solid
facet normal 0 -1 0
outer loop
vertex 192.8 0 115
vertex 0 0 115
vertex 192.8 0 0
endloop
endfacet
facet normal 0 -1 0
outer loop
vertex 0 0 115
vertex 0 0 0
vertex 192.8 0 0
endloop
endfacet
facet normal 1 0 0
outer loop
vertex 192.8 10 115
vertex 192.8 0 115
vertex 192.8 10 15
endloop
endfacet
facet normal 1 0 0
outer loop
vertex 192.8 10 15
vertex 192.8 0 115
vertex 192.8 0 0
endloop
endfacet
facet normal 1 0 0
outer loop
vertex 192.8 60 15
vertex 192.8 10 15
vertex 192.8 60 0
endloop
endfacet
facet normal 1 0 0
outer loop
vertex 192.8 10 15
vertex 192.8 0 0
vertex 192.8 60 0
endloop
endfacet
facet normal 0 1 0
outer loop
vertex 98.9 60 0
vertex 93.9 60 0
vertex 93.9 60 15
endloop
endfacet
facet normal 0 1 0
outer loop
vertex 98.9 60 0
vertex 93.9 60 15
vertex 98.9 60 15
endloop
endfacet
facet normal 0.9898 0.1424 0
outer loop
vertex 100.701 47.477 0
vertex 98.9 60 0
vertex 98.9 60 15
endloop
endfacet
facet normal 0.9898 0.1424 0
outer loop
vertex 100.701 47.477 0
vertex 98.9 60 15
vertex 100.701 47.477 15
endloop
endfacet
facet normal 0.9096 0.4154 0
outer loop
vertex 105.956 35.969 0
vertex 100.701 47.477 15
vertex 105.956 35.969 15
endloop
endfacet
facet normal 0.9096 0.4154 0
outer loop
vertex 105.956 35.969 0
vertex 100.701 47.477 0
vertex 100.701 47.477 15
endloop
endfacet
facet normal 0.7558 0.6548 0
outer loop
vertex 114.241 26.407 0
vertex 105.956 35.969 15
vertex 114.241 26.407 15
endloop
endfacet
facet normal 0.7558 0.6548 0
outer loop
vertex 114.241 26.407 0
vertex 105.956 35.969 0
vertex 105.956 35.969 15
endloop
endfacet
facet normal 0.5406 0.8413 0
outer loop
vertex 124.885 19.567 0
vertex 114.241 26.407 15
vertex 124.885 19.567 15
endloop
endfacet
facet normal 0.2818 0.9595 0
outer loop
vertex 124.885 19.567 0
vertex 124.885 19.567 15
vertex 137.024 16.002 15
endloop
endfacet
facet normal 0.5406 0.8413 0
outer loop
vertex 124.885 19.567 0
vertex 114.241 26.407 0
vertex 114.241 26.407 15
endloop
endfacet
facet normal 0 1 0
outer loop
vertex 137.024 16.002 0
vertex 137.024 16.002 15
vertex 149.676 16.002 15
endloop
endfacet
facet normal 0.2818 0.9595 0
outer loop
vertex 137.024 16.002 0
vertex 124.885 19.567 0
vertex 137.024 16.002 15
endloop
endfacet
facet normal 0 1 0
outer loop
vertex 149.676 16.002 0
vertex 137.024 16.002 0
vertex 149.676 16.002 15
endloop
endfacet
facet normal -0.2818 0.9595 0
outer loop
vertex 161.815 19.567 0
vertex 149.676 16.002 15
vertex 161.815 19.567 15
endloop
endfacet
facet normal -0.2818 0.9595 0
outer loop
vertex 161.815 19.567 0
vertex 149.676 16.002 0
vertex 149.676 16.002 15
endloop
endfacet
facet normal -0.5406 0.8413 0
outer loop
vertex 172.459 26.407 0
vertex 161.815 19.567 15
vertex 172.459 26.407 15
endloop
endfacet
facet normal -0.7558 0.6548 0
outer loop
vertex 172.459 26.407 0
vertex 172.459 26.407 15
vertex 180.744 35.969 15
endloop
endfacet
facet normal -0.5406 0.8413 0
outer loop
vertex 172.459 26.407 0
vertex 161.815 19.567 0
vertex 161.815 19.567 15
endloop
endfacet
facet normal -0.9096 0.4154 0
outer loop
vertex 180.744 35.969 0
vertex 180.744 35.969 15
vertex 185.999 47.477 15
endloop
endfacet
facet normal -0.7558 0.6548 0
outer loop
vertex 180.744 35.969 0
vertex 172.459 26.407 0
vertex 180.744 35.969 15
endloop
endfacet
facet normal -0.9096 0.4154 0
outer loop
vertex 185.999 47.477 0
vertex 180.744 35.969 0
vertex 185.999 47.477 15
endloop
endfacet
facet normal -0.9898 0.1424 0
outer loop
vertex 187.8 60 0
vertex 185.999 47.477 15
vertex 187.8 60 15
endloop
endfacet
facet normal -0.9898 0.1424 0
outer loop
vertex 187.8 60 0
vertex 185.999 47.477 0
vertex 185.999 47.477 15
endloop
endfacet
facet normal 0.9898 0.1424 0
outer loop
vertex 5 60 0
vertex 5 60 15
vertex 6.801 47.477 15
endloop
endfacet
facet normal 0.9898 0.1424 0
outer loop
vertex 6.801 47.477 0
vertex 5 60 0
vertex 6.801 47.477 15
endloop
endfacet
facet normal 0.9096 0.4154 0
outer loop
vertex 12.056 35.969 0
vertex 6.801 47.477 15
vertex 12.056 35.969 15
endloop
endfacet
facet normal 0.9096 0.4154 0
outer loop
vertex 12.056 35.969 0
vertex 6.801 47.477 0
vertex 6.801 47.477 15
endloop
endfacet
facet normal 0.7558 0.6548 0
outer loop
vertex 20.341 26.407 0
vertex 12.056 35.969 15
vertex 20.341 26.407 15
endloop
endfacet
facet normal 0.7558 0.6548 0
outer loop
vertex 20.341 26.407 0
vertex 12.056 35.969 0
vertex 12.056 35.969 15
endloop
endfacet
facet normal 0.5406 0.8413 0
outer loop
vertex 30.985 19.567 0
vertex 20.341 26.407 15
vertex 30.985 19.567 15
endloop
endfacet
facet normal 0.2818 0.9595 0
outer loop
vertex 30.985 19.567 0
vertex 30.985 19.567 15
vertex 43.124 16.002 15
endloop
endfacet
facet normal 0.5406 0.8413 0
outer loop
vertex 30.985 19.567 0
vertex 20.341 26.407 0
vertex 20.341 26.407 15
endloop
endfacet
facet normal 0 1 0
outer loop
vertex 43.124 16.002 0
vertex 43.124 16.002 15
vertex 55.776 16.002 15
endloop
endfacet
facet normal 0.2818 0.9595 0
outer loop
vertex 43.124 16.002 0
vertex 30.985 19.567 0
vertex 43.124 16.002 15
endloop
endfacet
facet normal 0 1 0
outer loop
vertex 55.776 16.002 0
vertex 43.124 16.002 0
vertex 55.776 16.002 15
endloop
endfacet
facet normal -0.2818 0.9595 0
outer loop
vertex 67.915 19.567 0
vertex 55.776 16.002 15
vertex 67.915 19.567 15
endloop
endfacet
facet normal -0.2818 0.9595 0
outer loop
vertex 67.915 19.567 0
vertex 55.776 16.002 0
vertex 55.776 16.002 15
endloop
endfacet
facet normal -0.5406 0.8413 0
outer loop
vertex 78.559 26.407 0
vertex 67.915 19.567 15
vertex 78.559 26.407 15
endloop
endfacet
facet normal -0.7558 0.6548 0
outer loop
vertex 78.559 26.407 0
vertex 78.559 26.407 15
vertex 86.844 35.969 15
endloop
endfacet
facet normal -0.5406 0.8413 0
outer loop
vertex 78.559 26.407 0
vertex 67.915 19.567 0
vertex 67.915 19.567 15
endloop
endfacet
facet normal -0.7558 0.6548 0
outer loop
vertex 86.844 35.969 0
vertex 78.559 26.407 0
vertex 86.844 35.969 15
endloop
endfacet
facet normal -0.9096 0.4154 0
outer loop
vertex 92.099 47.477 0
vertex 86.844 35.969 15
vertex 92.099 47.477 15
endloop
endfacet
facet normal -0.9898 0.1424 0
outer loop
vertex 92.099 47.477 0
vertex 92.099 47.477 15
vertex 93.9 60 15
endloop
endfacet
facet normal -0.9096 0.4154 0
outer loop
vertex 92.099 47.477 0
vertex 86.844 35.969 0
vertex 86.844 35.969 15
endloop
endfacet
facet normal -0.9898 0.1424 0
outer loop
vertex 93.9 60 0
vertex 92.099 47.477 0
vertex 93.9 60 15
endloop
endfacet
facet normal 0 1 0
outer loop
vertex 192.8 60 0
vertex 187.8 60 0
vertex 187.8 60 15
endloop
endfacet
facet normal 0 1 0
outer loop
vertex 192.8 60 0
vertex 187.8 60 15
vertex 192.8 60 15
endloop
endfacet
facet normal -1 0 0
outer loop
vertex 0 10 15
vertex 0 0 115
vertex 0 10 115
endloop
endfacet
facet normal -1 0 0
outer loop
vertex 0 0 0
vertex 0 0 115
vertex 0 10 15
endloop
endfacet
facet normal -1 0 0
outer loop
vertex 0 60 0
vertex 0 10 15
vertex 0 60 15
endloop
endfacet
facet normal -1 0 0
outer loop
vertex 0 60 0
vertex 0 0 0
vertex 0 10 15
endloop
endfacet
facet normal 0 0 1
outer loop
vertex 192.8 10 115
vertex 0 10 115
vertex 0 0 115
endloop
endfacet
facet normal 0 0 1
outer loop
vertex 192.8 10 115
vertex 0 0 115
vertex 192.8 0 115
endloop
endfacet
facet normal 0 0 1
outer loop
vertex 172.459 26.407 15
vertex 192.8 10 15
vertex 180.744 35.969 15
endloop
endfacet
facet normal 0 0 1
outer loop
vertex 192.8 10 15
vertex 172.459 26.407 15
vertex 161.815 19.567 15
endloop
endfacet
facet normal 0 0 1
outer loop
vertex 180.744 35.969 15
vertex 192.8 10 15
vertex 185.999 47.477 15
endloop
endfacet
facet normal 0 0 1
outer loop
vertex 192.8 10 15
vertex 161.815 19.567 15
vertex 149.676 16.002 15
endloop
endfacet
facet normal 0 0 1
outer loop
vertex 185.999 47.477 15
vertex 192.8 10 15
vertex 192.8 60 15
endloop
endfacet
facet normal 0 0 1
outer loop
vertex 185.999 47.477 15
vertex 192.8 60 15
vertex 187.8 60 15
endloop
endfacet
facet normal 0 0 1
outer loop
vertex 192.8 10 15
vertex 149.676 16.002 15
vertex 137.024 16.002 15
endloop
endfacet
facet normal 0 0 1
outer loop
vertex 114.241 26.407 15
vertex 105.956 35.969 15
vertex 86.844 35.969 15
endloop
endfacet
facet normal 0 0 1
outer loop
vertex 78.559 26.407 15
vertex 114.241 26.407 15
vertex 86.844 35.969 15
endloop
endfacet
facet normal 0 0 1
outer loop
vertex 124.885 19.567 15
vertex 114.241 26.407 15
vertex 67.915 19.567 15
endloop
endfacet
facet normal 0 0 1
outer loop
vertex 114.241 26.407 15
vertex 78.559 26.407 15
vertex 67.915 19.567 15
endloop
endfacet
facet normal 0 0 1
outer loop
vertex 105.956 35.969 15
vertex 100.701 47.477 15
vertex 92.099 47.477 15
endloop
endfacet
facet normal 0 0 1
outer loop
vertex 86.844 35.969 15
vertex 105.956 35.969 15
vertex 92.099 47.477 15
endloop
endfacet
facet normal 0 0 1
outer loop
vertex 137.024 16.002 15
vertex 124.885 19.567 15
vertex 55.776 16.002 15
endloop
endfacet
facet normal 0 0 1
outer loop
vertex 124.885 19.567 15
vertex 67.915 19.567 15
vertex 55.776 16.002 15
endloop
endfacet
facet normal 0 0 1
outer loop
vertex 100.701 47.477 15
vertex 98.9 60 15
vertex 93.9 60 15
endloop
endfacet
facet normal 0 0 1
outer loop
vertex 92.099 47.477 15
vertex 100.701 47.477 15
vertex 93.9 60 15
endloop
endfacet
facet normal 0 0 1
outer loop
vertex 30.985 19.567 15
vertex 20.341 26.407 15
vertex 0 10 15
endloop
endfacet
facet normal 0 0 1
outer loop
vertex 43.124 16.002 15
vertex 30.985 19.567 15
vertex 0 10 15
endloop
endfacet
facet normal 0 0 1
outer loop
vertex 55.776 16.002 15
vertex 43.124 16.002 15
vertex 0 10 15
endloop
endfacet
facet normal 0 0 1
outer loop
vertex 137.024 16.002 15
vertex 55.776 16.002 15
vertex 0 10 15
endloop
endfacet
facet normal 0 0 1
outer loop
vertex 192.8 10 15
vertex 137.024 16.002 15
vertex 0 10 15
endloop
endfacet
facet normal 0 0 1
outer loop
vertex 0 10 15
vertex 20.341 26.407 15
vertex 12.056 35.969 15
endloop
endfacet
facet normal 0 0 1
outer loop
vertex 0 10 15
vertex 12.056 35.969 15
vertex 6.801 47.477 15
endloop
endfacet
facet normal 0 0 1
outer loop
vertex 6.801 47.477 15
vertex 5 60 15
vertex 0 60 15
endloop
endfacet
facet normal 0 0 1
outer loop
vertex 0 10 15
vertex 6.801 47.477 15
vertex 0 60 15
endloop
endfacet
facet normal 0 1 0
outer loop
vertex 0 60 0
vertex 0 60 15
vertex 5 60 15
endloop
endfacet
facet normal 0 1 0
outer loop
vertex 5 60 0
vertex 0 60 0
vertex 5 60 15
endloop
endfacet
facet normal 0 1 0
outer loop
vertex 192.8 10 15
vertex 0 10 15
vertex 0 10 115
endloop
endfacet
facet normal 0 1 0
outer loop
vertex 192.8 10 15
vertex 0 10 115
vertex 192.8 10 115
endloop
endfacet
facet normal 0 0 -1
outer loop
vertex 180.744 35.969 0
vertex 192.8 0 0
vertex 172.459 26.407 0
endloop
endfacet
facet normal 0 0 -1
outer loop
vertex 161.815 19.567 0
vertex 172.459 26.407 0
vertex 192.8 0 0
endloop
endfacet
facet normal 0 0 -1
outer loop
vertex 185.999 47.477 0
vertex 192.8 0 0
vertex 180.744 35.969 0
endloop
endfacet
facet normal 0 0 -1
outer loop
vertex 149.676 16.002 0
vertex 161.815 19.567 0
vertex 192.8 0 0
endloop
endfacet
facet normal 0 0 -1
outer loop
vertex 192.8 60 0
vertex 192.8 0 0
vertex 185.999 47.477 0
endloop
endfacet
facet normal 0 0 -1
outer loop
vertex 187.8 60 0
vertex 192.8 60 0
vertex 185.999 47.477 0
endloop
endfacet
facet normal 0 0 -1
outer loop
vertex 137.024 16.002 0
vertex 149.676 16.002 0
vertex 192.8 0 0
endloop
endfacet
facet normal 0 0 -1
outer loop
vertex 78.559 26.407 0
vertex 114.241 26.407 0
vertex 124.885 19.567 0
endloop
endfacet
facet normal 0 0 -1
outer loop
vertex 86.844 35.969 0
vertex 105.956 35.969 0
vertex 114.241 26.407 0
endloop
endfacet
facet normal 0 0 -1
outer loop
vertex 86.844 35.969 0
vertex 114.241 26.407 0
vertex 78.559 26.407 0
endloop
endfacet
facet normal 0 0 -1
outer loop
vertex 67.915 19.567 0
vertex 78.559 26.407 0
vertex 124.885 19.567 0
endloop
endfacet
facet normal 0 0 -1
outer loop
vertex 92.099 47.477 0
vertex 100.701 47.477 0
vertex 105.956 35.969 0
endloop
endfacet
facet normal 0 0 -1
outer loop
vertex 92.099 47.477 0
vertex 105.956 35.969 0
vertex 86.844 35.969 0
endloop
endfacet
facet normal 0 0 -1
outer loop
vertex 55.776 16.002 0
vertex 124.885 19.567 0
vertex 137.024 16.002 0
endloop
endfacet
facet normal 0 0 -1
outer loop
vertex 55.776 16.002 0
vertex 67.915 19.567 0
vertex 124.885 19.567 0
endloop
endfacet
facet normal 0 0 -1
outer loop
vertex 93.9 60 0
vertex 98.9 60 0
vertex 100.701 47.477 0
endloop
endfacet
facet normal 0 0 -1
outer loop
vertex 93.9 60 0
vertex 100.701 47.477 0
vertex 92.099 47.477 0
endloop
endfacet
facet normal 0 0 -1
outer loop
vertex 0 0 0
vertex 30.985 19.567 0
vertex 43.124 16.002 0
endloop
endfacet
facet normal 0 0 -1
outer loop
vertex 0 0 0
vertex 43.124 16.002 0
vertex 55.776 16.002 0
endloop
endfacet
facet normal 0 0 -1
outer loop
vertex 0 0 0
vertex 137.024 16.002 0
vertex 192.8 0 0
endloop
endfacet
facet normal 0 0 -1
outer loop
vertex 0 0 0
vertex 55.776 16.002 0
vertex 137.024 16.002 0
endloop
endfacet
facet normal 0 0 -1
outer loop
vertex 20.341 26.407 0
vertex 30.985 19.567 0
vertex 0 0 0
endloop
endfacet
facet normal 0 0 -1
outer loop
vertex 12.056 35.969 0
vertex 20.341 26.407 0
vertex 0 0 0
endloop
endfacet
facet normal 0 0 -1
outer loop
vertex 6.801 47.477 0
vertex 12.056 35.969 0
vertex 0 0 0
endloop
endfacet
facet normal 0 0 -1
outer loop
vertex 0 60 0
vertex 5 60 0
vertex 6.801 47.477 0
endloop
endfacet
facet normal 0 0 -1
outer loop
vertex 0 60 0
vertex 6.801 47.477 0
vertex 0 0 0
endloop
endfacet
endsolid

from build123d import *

# Parameters (mm, degrees)
BOSS_EXTRUDE2_DEPTH = 15
SKETCH8_W           = 192.8
SKETCH8_H           = 10
BOSS_EXTRUDE3_DEPTH = 100


with BuildPart() as part:
    # Sketch7 → Boss-Extrude2 (new body)
    with BuildSketch(Plane.XY):
        with BuildLine():
            Line((0, 10), (0, 60))
            Line((0, 60), (5, 60))
            ThreePointArc((5, 60), (49.45, 15.55), (93.9, 60))
            Line((93.9, 60), (98.9, 60))
            ThreePointArc((98.9, 60), (143.35, 15.55), (187.8, 60))
            Line((187.8, 60), (192.8, 60))
            Line((192.8, 60), (192.8, 0))
            Line((192.8, 0), (0, 0))
            Line((0, 0), (0, 10))
        make_face()
    extrude(amount=BOSS_EXTRUDE2_DEPTH)

    # Sketch8 → Boss-Extrude3 (add)
    with BuildSketch(Plane.XY.offset(15)):
        with Locations((96.4, 5)):
            Rectangle(SKETCH8_W, SKETCH8_H)
    extrude(amount=BOSS_EXTRUDE3_DEPTH)


solid = part.part
